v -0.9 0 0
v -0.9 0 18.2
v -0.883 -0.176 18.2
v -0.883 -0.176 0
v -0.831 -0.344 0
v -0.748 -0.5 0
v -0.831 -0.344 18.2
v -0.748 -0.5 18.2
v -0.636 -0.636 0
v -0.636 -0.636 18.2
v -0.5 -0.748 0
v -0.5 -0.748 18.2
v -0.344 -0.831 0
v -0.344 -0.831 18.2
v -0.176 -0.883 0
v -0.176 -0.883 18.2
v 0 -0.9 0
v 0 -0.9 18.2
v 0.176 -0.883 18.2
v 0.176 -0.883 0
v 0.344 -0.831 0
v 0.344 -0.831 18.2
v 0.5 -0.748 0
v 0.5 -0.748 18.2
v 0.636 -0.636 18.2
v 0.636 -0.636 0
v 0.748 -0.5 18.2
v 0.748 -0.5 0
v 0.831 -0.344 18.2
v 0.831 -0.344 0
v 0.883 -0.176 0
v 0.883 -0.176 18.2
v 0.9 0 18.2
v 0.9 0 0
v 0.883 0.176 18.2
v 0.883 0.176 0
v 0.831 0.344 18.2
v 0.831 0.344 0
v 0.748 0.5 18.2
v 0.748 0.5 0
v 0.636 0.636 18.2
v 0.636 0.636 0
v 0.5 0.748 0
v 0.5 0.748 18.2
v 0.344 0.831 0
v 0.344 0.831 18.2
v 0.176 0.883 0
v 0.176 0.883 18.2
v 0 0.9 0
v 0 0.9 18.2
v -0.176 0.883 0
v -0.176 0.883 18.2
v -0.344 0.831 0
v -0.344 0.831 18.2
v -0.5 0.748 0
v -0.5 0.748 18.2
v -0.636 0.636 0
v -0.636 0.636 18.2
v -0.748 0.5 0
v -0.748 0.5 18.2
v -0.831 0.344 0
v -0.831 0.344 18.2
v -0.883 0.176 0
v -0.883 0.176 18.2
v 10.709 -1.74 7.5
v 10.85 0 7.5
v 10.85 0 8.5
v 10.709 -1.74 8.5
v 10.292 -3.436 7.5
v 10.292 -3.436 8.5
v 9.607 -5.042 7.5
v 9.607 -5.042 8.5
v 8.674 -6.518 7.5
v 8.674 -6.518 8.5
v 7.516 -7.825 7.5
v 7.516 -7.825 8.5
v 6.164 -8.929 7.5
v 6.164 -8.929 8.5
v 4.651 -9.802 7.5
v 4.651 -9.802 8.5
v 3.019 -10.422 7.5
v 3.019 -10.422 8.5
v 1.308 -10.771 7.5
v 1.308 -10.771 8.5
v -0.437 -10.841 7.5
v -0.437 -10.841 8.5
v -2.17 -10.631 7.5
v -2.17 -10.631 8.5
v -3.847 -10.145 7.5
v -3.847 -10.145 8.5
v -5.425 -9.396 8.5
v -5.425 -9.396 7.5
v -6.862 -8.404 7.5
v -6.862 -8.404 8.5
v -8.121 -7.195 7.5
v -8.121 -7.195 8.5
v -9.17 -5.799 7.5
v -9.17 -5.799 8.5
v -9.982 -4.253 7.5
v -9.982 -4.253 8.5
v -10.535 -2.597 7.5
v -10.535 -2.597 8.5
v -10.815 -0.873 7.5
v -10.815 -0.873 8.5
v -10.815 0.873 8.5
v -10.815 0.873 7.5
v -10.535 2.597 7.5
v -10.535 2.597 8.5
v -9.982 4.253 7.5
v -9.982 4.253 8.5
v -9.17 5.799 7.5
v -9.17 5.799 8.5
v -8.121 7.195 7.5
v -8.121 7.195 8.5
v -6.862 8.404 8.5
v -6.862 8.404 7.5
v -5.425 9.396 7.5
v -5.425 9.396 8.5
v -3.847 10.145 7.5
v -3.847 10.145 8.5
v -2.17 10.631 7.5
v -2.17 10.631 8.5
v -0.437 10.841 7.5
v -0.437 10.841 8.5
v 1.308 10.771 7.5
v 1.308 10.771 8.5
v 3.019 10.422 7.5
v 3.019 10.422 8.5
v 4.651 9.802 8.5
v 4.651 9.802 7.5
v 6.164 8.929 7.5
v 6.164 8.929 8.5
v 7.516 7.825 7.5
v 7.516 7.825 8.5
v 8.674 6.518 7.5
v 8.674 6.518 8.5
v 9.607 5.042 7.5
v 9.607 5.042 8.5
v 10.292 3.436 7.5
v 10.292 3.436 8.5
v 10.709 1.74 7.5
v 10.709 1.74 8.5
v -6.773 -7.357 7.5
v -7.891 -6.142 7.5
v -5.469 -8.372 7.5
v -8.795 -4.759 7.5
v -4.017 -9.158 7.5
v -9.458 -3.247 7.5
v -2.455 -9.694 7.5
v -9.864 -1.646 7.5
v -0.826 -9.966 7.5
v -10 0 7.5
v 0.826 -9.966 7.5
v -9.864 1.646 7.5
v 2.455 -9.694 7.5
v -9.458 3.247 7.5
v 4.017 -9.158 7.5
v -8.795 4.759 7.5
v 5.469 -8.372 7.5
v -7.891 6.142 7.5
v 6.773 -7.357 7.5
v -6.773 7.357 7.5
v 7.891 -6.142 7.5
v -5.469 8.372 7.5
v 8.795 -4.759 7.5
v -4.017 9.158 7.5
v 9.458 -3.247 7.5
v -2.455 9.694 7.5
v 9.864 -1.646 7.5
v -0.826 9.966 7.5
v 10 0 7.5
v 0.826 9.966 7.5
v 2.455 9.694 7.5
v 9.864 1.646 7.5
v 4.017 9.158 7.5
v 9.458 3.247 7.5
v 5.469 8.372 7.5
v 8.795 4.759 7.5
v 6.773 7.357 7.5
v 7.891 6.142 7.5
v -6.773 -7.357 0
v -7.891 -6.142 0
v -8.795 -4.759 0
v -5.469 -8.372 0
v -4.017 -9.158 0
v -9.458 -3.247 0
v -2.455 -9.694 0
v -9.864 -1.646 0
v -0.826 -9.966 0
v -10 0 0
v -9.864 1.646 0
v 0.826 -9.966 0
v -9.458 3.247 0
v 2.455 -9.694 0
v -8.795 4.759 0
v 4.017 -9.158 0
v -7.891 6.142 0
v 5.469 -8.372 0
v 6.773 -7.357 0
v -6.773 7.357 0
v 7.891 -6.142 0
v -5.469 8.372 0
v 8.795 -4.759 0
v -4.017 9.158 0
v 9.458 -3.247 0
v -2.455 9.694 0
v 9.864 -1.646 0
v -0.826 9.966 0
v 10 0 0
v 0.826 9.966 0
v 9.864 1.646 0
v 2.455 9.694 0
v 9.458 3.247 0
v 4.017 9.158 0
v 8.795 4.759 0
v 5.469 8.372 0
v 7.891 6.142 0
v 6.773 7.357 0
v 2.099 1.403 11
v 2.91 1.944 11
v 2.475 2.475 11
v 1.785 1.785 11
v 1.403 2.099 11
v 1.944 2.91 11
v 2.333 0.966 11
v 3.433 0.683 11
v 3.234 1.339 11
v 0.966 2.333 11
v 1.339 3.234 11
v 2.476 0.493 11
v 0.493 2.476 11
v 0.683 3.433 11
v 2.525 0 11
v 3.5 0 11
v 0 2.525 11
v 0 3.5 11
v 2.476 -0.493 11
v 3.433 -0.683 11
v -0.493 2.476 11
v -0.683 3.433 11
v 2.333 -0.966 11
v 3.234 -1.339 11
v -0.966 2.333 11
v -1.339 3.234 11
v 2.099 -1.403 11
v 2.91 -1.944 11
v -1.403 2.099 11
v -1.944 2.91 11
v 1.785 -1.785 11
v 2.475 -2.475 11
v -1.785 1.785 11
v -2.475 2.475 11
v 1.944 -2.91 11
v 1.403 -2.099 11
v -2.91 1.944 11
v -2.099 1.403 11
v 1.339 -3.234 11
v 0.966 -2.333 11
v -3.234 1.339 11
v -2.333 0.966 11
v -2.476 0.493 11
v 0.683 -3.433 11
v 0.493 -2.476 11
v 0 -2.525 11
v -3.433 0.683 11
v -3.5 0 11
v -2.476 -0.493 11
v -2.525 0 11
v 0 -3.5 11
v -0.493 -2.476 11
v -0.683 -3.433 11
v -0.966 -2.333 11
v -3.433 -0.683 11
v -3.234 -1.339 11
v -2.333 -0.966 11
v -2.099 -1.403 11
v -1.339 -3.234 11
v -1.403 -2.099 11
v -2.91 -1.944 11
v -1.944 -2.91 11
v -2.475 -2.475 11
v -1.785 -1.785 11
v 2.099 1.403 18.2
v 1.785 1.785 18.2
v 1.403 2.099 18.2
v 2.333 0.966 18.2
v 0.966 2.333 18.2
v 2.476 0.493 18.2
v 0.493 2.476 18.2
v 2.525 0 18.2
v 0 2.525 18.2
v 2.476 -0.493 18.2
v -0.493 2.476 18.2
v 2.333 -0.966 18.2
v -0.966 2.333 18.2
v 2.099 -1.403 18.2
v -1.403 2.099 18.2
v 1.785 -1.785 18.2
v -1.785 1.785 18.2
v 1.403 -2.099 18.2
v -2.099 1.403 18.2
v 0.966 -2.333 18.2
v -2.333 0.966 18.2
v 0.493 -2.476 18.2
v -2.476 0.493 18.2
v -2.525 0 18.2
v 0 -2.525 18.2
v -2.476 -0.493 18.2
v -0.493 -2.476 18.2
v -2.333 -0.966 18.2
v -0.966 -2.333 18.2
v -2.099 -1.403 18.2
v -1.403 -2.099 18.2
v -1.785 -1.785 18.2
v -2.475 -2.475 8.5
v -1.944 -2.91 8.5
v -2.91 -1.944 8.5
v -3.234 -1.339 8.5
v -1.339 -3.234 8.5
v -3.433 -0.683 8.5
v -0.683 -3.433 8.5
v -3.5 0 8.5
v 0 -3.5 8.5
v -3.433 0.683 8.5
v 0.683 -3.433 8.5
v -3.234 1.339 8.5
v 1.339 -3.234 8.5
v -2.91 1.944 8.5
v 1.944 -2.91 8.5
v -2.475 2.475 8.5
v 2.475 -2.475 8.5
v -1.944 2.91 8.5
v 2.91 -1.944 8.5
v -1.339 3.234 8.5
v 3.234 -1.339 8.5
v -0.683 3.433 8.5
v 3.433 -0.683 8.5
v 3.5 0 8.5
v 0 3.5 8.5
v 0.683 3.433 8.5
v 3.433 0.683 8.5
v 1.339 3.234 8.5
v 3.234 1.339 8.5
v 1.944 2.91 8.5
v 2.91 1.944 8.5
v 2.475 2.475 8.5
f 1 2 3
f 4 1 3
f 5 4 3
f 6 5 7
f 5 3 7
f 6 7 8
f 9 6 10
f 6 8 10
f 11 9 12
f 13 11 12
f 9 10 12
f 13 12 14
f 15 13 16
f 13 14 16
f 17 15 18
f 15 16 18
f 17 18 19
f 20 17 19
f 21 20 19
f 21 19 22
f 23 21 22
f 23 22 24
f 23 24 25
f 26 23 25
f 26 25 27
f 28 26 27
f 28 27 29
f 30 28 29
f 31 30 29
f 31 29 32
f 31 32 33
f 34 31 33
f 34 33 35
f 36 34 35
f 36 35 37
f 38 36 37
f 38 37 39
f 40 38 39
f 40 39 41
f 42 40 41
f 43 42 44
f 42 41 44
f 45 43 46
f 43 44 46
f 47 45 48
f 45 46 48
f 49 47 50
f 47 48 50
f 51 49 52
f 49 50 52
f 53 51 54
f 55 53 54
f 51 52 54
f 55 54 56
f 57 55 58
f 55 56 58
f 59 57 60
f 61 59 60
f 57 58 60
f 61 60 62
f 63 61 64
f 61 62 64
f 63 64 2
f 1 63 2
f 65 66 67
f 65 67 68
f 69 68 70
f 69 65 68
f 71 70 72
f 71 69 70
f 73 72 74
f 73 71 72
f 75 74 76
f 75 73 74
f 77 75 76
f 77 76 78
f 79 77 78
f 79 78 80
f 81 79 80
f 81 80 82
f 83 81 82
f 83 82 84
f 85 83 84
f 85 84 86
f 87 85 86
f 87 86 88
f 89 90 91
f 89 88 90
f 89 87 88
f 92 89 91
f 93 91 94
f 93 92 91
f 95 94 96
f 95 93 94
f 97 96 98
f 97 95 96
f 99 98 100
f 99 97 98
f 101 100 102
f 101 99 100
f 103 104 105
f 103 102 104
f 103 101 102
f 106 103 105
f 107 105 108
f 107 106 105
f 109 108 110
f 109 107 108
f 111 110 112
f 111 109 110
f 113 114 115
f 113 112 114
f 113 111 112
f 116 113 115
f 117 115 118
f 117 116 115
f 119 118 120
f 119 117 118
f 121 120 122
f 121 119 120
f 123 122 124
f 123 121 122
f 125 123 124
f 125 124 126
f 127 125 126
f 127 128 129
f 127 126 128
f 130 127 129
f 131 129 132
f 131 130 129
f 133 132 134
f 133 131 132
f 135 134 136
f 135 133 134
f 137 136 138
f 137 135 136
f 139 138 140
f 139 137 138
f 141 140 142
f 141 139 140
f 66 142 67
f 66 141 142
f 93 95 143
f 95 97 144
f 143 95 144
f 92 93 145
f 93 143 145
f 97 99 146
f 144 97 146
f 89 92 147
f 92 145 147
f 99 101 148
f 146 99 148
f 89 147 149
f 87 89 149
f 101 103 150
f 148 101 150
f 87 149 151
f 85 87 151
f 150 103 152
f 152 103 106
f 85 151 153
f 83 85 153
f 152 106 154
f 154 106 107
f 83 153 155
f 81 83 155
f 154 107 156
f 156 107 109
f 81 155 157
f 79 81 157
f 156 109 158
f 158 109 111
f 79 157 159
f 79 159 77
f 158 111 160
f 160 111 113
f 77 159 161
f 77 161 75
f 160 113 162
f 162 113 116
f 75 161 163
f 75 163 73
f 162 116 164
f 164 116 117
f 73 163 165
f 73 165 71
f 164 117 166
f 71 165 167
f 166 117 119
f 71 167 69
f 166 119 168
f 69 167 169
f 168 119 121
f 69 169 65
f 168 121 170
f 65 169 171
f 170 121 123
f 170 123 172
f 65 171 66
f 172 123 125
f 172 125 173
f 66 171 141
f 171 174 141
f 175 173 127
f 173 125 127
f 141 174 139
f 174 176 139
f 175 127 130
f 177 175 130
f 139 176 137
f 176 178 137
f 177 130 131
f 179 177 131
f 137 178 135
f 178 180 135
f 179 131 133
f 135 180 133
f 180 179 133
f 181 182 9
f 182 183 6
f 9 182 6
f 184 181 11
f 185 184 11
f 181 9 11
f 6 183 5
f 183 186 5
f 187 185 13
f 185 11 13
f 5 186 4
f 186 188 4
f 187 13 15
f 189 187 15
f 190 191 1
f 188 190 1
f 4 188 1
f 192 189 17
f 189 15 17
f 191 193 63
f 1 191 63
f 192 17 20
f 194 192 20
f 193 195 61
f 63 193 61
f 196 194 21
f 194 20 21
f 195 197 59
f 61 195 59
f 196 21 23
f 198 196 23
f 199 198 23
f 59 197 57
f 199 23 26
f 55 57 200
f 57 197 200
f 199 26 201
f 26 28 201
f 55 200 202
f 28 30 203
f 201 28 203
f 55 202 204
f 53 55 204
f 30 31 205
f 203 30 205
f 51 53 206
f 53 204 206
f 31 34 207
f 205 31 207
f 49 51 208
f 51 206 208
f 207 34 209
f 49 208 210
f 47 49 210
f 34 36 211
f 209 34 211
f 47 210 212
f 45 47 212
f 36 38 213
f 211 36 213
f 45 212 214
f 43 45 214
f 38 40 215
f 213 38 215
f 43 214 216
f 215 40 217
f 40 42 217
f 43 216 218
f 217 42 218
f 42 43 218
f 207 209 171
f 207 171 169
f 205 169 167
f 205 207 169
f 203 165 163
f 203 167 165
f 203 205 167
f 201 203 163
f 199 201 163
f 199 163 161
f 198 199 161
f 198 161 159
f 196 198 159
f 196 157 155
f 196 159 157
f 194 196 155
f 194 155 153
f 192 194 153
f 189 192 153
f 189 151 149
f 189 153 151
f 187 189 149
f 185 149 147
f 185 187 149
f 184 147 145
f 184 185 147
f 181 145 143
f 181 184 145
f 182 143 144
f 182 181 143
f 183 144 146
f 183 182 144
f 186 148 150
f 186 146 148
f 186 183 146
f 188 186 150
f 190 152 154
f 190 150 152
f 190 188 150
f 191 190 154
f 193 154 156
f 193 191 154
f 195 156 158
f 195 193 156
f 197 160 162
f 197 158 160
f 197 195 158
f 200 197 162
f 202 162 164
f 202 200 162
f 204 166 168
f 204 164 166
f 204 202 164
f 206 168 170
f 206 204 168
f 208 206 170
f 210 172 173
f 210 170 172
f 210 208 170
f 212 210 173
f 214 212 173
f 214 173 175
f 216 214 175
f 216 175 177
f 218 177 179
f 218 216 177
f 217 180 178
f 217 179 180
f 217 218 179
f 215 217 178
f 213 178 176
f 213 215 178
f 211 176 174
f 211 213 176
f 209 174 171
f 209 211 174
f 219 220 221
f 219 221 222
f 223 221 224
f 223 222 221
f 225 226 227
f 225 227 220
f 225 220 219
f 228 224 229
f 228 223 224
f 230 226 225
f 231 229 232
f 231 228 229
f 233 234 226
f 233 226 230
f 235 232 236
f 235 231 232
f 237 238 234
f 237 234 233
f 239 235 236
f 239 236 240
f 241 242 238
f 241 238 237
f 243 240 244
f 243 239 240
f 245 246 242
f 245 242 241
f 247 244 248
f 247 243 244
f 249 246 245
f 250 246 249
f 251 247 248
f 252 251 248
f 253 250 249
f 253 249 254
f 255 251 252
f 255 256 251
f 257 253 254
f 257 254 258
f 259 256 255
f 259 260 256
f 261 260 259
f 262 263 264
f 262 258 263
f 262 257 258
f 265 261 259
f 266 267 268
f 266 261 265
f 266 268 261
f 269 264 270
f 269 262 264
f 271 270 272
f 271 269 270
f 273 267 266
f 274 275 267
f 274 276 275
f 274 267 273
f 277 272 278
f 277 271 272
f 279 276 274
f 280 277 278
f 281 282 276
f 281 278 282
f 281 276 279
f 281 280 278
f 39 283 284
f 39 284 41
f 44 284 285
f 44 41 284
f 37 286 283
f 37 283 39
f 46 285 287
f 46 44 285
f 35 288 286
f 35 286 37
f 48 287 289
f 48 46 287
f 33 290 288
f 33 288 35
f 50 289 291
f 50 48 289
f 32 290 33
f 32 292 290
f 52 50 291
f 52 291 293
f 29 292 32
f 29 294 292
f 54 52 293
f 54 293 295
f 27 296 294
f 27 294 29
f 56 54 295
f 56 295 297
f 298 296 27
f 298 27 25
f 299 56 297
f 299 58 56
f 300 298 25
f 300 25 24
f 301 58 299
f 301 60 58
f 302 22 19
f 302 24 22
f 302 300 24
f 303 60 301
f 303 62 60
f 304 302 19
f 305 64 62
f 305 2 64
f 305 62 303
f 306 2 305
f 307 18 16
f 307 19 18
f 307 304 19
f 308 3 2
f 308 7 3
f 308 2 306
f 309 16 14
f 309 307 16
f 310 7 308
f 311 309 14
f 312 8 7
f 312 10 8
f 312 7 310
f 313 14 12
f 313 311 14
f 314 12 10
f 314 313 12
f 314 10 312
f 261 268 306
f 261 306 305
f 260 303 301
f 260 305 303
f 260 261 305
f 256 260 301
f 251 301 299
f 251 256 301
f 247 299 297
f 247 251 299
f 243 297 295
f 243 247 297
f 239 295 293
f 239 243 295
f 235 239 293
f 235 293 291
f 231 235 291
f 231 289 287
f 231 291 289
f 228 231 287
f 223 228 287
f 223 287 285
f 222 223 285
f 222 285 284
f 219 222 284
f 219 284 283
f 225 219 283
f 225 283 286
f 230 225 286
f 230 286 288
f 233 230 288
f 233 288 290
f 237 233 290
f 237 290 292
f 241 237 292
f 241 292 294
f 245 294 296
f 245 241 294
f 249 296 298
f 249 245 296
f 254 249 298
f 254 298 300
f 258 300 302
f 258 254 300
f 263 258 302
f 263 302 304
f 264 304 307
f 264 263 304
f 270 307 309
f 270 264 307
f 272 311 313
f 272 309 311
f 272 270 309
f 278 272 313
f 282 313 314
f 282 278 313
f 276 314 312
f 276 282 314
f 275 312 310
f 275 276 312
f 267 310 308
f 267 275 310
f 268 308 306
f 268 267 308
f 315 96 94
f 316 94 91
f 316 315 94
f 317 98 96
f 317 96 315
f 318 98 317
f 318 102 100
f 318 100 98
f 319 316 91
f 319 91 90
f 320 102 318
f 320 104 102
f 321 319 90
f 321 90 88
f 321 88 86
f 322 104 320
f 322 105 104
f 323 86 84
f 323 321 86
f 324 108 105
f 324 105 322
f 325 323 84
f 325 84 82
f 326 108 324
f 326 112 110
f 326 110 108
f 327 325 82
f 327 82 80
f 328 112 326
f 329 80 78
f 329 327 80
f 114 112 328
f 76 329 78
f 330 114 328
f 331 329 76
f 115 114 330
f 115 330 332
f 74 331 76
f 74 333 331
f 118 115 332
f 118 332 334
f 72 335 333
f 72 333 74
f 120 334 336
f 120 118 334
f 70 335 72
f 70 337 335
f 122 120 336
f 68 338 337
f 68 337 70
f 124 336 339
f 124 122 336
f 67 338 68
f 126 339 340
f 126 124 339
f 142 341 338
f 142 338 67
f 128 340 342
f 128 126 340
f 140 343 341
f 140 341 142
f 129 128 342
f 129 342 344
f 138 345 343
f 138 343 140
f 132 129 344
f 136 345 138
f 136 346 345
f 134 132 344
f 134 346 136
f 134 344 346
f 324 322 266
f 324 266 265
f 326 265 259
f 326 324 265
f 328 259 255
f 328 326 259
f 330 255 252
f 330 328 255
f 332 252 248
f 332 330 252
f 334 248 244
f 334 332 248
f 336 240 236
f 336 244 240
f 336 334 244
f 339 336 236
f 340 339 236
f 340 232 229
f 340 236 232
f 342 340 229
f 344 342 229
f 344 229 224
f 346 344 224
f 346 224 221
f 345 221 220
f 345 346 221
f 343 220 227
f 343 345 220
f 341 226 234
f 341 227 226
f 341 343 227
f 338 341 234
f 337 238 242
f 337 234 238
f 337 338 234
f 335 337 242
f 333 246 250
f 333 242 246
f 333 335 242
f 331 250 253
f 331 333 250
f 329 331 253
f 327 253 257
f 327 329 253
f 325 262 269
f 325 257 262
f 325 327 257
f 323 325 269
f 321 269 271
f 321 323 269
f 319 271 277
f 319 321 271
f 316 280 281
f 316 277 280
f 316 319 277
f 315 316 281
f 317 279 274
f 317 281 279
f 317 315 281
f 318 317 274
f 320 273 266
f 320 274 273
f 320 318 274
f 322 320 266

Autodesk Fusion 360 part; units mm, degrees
sketch "Skizze1" plane through (0, 0, 0) normal (0, 0, 1) x (1, 0, 0)
  circle A0 centre (0, 0) radius 10
  circle A1 centre (0, 0) radius 9.25
  circle A2 centre (0, 0) radius 3.95
  circle A3 centre (0, 0) radius 10.85
  dimension "d1" = 20
  dimension "d2" = -0.75
  dimension "d3" = 7.9
  dimension "d4" = 1.6
extrude "Extrusion1" add sketch "Skizze1" along normal blind 8.5 contours A0 | A1 | A2
sketch "Skizze4" plane through (0, 0, 8.5) normal (0, 0, 1) x (-1, 0, 0)
  circle A0 centre (0, 0) radius 10
  circle A1 centre (0, 0) radius 2.525
  circle A2 centre (0, 0) radius 3.5
  dimension "d20" = 5.05
  dimension "d21" = 7
extrude "Extrusion5" add sketch "Skizze1" along normal blind 8.5 contours A3
extrude "Extrusion6" cut sketch "Skizze1" along normal blind 7.5 contours A3
extrude "Extrusion8" add sketch "Skizze4" along normal blind 9.7 contours A1
extrude "Extrusion9" add sketch "Skizze4" along normal blind 2.5 contours A2
sketch "Skizze5" plane through (0, 0, 18.2) normal (0, 0, 1) x (-1, 0, 0)
  circle A0 centre (0, 0) radius 2.525
  circle A1 centre (0, 0) radius 0.9
  dimension "d27" = 1.8
extrude "Extrusion10" cut sketch "Skizze5" against normal blind 21 contours A1
equation "d5 = 11 mm - 2.5 mm"
equation "d14 = 11 mm - 2.5 mm"
equation "d16 = 10 mm - 2.5 mm"
